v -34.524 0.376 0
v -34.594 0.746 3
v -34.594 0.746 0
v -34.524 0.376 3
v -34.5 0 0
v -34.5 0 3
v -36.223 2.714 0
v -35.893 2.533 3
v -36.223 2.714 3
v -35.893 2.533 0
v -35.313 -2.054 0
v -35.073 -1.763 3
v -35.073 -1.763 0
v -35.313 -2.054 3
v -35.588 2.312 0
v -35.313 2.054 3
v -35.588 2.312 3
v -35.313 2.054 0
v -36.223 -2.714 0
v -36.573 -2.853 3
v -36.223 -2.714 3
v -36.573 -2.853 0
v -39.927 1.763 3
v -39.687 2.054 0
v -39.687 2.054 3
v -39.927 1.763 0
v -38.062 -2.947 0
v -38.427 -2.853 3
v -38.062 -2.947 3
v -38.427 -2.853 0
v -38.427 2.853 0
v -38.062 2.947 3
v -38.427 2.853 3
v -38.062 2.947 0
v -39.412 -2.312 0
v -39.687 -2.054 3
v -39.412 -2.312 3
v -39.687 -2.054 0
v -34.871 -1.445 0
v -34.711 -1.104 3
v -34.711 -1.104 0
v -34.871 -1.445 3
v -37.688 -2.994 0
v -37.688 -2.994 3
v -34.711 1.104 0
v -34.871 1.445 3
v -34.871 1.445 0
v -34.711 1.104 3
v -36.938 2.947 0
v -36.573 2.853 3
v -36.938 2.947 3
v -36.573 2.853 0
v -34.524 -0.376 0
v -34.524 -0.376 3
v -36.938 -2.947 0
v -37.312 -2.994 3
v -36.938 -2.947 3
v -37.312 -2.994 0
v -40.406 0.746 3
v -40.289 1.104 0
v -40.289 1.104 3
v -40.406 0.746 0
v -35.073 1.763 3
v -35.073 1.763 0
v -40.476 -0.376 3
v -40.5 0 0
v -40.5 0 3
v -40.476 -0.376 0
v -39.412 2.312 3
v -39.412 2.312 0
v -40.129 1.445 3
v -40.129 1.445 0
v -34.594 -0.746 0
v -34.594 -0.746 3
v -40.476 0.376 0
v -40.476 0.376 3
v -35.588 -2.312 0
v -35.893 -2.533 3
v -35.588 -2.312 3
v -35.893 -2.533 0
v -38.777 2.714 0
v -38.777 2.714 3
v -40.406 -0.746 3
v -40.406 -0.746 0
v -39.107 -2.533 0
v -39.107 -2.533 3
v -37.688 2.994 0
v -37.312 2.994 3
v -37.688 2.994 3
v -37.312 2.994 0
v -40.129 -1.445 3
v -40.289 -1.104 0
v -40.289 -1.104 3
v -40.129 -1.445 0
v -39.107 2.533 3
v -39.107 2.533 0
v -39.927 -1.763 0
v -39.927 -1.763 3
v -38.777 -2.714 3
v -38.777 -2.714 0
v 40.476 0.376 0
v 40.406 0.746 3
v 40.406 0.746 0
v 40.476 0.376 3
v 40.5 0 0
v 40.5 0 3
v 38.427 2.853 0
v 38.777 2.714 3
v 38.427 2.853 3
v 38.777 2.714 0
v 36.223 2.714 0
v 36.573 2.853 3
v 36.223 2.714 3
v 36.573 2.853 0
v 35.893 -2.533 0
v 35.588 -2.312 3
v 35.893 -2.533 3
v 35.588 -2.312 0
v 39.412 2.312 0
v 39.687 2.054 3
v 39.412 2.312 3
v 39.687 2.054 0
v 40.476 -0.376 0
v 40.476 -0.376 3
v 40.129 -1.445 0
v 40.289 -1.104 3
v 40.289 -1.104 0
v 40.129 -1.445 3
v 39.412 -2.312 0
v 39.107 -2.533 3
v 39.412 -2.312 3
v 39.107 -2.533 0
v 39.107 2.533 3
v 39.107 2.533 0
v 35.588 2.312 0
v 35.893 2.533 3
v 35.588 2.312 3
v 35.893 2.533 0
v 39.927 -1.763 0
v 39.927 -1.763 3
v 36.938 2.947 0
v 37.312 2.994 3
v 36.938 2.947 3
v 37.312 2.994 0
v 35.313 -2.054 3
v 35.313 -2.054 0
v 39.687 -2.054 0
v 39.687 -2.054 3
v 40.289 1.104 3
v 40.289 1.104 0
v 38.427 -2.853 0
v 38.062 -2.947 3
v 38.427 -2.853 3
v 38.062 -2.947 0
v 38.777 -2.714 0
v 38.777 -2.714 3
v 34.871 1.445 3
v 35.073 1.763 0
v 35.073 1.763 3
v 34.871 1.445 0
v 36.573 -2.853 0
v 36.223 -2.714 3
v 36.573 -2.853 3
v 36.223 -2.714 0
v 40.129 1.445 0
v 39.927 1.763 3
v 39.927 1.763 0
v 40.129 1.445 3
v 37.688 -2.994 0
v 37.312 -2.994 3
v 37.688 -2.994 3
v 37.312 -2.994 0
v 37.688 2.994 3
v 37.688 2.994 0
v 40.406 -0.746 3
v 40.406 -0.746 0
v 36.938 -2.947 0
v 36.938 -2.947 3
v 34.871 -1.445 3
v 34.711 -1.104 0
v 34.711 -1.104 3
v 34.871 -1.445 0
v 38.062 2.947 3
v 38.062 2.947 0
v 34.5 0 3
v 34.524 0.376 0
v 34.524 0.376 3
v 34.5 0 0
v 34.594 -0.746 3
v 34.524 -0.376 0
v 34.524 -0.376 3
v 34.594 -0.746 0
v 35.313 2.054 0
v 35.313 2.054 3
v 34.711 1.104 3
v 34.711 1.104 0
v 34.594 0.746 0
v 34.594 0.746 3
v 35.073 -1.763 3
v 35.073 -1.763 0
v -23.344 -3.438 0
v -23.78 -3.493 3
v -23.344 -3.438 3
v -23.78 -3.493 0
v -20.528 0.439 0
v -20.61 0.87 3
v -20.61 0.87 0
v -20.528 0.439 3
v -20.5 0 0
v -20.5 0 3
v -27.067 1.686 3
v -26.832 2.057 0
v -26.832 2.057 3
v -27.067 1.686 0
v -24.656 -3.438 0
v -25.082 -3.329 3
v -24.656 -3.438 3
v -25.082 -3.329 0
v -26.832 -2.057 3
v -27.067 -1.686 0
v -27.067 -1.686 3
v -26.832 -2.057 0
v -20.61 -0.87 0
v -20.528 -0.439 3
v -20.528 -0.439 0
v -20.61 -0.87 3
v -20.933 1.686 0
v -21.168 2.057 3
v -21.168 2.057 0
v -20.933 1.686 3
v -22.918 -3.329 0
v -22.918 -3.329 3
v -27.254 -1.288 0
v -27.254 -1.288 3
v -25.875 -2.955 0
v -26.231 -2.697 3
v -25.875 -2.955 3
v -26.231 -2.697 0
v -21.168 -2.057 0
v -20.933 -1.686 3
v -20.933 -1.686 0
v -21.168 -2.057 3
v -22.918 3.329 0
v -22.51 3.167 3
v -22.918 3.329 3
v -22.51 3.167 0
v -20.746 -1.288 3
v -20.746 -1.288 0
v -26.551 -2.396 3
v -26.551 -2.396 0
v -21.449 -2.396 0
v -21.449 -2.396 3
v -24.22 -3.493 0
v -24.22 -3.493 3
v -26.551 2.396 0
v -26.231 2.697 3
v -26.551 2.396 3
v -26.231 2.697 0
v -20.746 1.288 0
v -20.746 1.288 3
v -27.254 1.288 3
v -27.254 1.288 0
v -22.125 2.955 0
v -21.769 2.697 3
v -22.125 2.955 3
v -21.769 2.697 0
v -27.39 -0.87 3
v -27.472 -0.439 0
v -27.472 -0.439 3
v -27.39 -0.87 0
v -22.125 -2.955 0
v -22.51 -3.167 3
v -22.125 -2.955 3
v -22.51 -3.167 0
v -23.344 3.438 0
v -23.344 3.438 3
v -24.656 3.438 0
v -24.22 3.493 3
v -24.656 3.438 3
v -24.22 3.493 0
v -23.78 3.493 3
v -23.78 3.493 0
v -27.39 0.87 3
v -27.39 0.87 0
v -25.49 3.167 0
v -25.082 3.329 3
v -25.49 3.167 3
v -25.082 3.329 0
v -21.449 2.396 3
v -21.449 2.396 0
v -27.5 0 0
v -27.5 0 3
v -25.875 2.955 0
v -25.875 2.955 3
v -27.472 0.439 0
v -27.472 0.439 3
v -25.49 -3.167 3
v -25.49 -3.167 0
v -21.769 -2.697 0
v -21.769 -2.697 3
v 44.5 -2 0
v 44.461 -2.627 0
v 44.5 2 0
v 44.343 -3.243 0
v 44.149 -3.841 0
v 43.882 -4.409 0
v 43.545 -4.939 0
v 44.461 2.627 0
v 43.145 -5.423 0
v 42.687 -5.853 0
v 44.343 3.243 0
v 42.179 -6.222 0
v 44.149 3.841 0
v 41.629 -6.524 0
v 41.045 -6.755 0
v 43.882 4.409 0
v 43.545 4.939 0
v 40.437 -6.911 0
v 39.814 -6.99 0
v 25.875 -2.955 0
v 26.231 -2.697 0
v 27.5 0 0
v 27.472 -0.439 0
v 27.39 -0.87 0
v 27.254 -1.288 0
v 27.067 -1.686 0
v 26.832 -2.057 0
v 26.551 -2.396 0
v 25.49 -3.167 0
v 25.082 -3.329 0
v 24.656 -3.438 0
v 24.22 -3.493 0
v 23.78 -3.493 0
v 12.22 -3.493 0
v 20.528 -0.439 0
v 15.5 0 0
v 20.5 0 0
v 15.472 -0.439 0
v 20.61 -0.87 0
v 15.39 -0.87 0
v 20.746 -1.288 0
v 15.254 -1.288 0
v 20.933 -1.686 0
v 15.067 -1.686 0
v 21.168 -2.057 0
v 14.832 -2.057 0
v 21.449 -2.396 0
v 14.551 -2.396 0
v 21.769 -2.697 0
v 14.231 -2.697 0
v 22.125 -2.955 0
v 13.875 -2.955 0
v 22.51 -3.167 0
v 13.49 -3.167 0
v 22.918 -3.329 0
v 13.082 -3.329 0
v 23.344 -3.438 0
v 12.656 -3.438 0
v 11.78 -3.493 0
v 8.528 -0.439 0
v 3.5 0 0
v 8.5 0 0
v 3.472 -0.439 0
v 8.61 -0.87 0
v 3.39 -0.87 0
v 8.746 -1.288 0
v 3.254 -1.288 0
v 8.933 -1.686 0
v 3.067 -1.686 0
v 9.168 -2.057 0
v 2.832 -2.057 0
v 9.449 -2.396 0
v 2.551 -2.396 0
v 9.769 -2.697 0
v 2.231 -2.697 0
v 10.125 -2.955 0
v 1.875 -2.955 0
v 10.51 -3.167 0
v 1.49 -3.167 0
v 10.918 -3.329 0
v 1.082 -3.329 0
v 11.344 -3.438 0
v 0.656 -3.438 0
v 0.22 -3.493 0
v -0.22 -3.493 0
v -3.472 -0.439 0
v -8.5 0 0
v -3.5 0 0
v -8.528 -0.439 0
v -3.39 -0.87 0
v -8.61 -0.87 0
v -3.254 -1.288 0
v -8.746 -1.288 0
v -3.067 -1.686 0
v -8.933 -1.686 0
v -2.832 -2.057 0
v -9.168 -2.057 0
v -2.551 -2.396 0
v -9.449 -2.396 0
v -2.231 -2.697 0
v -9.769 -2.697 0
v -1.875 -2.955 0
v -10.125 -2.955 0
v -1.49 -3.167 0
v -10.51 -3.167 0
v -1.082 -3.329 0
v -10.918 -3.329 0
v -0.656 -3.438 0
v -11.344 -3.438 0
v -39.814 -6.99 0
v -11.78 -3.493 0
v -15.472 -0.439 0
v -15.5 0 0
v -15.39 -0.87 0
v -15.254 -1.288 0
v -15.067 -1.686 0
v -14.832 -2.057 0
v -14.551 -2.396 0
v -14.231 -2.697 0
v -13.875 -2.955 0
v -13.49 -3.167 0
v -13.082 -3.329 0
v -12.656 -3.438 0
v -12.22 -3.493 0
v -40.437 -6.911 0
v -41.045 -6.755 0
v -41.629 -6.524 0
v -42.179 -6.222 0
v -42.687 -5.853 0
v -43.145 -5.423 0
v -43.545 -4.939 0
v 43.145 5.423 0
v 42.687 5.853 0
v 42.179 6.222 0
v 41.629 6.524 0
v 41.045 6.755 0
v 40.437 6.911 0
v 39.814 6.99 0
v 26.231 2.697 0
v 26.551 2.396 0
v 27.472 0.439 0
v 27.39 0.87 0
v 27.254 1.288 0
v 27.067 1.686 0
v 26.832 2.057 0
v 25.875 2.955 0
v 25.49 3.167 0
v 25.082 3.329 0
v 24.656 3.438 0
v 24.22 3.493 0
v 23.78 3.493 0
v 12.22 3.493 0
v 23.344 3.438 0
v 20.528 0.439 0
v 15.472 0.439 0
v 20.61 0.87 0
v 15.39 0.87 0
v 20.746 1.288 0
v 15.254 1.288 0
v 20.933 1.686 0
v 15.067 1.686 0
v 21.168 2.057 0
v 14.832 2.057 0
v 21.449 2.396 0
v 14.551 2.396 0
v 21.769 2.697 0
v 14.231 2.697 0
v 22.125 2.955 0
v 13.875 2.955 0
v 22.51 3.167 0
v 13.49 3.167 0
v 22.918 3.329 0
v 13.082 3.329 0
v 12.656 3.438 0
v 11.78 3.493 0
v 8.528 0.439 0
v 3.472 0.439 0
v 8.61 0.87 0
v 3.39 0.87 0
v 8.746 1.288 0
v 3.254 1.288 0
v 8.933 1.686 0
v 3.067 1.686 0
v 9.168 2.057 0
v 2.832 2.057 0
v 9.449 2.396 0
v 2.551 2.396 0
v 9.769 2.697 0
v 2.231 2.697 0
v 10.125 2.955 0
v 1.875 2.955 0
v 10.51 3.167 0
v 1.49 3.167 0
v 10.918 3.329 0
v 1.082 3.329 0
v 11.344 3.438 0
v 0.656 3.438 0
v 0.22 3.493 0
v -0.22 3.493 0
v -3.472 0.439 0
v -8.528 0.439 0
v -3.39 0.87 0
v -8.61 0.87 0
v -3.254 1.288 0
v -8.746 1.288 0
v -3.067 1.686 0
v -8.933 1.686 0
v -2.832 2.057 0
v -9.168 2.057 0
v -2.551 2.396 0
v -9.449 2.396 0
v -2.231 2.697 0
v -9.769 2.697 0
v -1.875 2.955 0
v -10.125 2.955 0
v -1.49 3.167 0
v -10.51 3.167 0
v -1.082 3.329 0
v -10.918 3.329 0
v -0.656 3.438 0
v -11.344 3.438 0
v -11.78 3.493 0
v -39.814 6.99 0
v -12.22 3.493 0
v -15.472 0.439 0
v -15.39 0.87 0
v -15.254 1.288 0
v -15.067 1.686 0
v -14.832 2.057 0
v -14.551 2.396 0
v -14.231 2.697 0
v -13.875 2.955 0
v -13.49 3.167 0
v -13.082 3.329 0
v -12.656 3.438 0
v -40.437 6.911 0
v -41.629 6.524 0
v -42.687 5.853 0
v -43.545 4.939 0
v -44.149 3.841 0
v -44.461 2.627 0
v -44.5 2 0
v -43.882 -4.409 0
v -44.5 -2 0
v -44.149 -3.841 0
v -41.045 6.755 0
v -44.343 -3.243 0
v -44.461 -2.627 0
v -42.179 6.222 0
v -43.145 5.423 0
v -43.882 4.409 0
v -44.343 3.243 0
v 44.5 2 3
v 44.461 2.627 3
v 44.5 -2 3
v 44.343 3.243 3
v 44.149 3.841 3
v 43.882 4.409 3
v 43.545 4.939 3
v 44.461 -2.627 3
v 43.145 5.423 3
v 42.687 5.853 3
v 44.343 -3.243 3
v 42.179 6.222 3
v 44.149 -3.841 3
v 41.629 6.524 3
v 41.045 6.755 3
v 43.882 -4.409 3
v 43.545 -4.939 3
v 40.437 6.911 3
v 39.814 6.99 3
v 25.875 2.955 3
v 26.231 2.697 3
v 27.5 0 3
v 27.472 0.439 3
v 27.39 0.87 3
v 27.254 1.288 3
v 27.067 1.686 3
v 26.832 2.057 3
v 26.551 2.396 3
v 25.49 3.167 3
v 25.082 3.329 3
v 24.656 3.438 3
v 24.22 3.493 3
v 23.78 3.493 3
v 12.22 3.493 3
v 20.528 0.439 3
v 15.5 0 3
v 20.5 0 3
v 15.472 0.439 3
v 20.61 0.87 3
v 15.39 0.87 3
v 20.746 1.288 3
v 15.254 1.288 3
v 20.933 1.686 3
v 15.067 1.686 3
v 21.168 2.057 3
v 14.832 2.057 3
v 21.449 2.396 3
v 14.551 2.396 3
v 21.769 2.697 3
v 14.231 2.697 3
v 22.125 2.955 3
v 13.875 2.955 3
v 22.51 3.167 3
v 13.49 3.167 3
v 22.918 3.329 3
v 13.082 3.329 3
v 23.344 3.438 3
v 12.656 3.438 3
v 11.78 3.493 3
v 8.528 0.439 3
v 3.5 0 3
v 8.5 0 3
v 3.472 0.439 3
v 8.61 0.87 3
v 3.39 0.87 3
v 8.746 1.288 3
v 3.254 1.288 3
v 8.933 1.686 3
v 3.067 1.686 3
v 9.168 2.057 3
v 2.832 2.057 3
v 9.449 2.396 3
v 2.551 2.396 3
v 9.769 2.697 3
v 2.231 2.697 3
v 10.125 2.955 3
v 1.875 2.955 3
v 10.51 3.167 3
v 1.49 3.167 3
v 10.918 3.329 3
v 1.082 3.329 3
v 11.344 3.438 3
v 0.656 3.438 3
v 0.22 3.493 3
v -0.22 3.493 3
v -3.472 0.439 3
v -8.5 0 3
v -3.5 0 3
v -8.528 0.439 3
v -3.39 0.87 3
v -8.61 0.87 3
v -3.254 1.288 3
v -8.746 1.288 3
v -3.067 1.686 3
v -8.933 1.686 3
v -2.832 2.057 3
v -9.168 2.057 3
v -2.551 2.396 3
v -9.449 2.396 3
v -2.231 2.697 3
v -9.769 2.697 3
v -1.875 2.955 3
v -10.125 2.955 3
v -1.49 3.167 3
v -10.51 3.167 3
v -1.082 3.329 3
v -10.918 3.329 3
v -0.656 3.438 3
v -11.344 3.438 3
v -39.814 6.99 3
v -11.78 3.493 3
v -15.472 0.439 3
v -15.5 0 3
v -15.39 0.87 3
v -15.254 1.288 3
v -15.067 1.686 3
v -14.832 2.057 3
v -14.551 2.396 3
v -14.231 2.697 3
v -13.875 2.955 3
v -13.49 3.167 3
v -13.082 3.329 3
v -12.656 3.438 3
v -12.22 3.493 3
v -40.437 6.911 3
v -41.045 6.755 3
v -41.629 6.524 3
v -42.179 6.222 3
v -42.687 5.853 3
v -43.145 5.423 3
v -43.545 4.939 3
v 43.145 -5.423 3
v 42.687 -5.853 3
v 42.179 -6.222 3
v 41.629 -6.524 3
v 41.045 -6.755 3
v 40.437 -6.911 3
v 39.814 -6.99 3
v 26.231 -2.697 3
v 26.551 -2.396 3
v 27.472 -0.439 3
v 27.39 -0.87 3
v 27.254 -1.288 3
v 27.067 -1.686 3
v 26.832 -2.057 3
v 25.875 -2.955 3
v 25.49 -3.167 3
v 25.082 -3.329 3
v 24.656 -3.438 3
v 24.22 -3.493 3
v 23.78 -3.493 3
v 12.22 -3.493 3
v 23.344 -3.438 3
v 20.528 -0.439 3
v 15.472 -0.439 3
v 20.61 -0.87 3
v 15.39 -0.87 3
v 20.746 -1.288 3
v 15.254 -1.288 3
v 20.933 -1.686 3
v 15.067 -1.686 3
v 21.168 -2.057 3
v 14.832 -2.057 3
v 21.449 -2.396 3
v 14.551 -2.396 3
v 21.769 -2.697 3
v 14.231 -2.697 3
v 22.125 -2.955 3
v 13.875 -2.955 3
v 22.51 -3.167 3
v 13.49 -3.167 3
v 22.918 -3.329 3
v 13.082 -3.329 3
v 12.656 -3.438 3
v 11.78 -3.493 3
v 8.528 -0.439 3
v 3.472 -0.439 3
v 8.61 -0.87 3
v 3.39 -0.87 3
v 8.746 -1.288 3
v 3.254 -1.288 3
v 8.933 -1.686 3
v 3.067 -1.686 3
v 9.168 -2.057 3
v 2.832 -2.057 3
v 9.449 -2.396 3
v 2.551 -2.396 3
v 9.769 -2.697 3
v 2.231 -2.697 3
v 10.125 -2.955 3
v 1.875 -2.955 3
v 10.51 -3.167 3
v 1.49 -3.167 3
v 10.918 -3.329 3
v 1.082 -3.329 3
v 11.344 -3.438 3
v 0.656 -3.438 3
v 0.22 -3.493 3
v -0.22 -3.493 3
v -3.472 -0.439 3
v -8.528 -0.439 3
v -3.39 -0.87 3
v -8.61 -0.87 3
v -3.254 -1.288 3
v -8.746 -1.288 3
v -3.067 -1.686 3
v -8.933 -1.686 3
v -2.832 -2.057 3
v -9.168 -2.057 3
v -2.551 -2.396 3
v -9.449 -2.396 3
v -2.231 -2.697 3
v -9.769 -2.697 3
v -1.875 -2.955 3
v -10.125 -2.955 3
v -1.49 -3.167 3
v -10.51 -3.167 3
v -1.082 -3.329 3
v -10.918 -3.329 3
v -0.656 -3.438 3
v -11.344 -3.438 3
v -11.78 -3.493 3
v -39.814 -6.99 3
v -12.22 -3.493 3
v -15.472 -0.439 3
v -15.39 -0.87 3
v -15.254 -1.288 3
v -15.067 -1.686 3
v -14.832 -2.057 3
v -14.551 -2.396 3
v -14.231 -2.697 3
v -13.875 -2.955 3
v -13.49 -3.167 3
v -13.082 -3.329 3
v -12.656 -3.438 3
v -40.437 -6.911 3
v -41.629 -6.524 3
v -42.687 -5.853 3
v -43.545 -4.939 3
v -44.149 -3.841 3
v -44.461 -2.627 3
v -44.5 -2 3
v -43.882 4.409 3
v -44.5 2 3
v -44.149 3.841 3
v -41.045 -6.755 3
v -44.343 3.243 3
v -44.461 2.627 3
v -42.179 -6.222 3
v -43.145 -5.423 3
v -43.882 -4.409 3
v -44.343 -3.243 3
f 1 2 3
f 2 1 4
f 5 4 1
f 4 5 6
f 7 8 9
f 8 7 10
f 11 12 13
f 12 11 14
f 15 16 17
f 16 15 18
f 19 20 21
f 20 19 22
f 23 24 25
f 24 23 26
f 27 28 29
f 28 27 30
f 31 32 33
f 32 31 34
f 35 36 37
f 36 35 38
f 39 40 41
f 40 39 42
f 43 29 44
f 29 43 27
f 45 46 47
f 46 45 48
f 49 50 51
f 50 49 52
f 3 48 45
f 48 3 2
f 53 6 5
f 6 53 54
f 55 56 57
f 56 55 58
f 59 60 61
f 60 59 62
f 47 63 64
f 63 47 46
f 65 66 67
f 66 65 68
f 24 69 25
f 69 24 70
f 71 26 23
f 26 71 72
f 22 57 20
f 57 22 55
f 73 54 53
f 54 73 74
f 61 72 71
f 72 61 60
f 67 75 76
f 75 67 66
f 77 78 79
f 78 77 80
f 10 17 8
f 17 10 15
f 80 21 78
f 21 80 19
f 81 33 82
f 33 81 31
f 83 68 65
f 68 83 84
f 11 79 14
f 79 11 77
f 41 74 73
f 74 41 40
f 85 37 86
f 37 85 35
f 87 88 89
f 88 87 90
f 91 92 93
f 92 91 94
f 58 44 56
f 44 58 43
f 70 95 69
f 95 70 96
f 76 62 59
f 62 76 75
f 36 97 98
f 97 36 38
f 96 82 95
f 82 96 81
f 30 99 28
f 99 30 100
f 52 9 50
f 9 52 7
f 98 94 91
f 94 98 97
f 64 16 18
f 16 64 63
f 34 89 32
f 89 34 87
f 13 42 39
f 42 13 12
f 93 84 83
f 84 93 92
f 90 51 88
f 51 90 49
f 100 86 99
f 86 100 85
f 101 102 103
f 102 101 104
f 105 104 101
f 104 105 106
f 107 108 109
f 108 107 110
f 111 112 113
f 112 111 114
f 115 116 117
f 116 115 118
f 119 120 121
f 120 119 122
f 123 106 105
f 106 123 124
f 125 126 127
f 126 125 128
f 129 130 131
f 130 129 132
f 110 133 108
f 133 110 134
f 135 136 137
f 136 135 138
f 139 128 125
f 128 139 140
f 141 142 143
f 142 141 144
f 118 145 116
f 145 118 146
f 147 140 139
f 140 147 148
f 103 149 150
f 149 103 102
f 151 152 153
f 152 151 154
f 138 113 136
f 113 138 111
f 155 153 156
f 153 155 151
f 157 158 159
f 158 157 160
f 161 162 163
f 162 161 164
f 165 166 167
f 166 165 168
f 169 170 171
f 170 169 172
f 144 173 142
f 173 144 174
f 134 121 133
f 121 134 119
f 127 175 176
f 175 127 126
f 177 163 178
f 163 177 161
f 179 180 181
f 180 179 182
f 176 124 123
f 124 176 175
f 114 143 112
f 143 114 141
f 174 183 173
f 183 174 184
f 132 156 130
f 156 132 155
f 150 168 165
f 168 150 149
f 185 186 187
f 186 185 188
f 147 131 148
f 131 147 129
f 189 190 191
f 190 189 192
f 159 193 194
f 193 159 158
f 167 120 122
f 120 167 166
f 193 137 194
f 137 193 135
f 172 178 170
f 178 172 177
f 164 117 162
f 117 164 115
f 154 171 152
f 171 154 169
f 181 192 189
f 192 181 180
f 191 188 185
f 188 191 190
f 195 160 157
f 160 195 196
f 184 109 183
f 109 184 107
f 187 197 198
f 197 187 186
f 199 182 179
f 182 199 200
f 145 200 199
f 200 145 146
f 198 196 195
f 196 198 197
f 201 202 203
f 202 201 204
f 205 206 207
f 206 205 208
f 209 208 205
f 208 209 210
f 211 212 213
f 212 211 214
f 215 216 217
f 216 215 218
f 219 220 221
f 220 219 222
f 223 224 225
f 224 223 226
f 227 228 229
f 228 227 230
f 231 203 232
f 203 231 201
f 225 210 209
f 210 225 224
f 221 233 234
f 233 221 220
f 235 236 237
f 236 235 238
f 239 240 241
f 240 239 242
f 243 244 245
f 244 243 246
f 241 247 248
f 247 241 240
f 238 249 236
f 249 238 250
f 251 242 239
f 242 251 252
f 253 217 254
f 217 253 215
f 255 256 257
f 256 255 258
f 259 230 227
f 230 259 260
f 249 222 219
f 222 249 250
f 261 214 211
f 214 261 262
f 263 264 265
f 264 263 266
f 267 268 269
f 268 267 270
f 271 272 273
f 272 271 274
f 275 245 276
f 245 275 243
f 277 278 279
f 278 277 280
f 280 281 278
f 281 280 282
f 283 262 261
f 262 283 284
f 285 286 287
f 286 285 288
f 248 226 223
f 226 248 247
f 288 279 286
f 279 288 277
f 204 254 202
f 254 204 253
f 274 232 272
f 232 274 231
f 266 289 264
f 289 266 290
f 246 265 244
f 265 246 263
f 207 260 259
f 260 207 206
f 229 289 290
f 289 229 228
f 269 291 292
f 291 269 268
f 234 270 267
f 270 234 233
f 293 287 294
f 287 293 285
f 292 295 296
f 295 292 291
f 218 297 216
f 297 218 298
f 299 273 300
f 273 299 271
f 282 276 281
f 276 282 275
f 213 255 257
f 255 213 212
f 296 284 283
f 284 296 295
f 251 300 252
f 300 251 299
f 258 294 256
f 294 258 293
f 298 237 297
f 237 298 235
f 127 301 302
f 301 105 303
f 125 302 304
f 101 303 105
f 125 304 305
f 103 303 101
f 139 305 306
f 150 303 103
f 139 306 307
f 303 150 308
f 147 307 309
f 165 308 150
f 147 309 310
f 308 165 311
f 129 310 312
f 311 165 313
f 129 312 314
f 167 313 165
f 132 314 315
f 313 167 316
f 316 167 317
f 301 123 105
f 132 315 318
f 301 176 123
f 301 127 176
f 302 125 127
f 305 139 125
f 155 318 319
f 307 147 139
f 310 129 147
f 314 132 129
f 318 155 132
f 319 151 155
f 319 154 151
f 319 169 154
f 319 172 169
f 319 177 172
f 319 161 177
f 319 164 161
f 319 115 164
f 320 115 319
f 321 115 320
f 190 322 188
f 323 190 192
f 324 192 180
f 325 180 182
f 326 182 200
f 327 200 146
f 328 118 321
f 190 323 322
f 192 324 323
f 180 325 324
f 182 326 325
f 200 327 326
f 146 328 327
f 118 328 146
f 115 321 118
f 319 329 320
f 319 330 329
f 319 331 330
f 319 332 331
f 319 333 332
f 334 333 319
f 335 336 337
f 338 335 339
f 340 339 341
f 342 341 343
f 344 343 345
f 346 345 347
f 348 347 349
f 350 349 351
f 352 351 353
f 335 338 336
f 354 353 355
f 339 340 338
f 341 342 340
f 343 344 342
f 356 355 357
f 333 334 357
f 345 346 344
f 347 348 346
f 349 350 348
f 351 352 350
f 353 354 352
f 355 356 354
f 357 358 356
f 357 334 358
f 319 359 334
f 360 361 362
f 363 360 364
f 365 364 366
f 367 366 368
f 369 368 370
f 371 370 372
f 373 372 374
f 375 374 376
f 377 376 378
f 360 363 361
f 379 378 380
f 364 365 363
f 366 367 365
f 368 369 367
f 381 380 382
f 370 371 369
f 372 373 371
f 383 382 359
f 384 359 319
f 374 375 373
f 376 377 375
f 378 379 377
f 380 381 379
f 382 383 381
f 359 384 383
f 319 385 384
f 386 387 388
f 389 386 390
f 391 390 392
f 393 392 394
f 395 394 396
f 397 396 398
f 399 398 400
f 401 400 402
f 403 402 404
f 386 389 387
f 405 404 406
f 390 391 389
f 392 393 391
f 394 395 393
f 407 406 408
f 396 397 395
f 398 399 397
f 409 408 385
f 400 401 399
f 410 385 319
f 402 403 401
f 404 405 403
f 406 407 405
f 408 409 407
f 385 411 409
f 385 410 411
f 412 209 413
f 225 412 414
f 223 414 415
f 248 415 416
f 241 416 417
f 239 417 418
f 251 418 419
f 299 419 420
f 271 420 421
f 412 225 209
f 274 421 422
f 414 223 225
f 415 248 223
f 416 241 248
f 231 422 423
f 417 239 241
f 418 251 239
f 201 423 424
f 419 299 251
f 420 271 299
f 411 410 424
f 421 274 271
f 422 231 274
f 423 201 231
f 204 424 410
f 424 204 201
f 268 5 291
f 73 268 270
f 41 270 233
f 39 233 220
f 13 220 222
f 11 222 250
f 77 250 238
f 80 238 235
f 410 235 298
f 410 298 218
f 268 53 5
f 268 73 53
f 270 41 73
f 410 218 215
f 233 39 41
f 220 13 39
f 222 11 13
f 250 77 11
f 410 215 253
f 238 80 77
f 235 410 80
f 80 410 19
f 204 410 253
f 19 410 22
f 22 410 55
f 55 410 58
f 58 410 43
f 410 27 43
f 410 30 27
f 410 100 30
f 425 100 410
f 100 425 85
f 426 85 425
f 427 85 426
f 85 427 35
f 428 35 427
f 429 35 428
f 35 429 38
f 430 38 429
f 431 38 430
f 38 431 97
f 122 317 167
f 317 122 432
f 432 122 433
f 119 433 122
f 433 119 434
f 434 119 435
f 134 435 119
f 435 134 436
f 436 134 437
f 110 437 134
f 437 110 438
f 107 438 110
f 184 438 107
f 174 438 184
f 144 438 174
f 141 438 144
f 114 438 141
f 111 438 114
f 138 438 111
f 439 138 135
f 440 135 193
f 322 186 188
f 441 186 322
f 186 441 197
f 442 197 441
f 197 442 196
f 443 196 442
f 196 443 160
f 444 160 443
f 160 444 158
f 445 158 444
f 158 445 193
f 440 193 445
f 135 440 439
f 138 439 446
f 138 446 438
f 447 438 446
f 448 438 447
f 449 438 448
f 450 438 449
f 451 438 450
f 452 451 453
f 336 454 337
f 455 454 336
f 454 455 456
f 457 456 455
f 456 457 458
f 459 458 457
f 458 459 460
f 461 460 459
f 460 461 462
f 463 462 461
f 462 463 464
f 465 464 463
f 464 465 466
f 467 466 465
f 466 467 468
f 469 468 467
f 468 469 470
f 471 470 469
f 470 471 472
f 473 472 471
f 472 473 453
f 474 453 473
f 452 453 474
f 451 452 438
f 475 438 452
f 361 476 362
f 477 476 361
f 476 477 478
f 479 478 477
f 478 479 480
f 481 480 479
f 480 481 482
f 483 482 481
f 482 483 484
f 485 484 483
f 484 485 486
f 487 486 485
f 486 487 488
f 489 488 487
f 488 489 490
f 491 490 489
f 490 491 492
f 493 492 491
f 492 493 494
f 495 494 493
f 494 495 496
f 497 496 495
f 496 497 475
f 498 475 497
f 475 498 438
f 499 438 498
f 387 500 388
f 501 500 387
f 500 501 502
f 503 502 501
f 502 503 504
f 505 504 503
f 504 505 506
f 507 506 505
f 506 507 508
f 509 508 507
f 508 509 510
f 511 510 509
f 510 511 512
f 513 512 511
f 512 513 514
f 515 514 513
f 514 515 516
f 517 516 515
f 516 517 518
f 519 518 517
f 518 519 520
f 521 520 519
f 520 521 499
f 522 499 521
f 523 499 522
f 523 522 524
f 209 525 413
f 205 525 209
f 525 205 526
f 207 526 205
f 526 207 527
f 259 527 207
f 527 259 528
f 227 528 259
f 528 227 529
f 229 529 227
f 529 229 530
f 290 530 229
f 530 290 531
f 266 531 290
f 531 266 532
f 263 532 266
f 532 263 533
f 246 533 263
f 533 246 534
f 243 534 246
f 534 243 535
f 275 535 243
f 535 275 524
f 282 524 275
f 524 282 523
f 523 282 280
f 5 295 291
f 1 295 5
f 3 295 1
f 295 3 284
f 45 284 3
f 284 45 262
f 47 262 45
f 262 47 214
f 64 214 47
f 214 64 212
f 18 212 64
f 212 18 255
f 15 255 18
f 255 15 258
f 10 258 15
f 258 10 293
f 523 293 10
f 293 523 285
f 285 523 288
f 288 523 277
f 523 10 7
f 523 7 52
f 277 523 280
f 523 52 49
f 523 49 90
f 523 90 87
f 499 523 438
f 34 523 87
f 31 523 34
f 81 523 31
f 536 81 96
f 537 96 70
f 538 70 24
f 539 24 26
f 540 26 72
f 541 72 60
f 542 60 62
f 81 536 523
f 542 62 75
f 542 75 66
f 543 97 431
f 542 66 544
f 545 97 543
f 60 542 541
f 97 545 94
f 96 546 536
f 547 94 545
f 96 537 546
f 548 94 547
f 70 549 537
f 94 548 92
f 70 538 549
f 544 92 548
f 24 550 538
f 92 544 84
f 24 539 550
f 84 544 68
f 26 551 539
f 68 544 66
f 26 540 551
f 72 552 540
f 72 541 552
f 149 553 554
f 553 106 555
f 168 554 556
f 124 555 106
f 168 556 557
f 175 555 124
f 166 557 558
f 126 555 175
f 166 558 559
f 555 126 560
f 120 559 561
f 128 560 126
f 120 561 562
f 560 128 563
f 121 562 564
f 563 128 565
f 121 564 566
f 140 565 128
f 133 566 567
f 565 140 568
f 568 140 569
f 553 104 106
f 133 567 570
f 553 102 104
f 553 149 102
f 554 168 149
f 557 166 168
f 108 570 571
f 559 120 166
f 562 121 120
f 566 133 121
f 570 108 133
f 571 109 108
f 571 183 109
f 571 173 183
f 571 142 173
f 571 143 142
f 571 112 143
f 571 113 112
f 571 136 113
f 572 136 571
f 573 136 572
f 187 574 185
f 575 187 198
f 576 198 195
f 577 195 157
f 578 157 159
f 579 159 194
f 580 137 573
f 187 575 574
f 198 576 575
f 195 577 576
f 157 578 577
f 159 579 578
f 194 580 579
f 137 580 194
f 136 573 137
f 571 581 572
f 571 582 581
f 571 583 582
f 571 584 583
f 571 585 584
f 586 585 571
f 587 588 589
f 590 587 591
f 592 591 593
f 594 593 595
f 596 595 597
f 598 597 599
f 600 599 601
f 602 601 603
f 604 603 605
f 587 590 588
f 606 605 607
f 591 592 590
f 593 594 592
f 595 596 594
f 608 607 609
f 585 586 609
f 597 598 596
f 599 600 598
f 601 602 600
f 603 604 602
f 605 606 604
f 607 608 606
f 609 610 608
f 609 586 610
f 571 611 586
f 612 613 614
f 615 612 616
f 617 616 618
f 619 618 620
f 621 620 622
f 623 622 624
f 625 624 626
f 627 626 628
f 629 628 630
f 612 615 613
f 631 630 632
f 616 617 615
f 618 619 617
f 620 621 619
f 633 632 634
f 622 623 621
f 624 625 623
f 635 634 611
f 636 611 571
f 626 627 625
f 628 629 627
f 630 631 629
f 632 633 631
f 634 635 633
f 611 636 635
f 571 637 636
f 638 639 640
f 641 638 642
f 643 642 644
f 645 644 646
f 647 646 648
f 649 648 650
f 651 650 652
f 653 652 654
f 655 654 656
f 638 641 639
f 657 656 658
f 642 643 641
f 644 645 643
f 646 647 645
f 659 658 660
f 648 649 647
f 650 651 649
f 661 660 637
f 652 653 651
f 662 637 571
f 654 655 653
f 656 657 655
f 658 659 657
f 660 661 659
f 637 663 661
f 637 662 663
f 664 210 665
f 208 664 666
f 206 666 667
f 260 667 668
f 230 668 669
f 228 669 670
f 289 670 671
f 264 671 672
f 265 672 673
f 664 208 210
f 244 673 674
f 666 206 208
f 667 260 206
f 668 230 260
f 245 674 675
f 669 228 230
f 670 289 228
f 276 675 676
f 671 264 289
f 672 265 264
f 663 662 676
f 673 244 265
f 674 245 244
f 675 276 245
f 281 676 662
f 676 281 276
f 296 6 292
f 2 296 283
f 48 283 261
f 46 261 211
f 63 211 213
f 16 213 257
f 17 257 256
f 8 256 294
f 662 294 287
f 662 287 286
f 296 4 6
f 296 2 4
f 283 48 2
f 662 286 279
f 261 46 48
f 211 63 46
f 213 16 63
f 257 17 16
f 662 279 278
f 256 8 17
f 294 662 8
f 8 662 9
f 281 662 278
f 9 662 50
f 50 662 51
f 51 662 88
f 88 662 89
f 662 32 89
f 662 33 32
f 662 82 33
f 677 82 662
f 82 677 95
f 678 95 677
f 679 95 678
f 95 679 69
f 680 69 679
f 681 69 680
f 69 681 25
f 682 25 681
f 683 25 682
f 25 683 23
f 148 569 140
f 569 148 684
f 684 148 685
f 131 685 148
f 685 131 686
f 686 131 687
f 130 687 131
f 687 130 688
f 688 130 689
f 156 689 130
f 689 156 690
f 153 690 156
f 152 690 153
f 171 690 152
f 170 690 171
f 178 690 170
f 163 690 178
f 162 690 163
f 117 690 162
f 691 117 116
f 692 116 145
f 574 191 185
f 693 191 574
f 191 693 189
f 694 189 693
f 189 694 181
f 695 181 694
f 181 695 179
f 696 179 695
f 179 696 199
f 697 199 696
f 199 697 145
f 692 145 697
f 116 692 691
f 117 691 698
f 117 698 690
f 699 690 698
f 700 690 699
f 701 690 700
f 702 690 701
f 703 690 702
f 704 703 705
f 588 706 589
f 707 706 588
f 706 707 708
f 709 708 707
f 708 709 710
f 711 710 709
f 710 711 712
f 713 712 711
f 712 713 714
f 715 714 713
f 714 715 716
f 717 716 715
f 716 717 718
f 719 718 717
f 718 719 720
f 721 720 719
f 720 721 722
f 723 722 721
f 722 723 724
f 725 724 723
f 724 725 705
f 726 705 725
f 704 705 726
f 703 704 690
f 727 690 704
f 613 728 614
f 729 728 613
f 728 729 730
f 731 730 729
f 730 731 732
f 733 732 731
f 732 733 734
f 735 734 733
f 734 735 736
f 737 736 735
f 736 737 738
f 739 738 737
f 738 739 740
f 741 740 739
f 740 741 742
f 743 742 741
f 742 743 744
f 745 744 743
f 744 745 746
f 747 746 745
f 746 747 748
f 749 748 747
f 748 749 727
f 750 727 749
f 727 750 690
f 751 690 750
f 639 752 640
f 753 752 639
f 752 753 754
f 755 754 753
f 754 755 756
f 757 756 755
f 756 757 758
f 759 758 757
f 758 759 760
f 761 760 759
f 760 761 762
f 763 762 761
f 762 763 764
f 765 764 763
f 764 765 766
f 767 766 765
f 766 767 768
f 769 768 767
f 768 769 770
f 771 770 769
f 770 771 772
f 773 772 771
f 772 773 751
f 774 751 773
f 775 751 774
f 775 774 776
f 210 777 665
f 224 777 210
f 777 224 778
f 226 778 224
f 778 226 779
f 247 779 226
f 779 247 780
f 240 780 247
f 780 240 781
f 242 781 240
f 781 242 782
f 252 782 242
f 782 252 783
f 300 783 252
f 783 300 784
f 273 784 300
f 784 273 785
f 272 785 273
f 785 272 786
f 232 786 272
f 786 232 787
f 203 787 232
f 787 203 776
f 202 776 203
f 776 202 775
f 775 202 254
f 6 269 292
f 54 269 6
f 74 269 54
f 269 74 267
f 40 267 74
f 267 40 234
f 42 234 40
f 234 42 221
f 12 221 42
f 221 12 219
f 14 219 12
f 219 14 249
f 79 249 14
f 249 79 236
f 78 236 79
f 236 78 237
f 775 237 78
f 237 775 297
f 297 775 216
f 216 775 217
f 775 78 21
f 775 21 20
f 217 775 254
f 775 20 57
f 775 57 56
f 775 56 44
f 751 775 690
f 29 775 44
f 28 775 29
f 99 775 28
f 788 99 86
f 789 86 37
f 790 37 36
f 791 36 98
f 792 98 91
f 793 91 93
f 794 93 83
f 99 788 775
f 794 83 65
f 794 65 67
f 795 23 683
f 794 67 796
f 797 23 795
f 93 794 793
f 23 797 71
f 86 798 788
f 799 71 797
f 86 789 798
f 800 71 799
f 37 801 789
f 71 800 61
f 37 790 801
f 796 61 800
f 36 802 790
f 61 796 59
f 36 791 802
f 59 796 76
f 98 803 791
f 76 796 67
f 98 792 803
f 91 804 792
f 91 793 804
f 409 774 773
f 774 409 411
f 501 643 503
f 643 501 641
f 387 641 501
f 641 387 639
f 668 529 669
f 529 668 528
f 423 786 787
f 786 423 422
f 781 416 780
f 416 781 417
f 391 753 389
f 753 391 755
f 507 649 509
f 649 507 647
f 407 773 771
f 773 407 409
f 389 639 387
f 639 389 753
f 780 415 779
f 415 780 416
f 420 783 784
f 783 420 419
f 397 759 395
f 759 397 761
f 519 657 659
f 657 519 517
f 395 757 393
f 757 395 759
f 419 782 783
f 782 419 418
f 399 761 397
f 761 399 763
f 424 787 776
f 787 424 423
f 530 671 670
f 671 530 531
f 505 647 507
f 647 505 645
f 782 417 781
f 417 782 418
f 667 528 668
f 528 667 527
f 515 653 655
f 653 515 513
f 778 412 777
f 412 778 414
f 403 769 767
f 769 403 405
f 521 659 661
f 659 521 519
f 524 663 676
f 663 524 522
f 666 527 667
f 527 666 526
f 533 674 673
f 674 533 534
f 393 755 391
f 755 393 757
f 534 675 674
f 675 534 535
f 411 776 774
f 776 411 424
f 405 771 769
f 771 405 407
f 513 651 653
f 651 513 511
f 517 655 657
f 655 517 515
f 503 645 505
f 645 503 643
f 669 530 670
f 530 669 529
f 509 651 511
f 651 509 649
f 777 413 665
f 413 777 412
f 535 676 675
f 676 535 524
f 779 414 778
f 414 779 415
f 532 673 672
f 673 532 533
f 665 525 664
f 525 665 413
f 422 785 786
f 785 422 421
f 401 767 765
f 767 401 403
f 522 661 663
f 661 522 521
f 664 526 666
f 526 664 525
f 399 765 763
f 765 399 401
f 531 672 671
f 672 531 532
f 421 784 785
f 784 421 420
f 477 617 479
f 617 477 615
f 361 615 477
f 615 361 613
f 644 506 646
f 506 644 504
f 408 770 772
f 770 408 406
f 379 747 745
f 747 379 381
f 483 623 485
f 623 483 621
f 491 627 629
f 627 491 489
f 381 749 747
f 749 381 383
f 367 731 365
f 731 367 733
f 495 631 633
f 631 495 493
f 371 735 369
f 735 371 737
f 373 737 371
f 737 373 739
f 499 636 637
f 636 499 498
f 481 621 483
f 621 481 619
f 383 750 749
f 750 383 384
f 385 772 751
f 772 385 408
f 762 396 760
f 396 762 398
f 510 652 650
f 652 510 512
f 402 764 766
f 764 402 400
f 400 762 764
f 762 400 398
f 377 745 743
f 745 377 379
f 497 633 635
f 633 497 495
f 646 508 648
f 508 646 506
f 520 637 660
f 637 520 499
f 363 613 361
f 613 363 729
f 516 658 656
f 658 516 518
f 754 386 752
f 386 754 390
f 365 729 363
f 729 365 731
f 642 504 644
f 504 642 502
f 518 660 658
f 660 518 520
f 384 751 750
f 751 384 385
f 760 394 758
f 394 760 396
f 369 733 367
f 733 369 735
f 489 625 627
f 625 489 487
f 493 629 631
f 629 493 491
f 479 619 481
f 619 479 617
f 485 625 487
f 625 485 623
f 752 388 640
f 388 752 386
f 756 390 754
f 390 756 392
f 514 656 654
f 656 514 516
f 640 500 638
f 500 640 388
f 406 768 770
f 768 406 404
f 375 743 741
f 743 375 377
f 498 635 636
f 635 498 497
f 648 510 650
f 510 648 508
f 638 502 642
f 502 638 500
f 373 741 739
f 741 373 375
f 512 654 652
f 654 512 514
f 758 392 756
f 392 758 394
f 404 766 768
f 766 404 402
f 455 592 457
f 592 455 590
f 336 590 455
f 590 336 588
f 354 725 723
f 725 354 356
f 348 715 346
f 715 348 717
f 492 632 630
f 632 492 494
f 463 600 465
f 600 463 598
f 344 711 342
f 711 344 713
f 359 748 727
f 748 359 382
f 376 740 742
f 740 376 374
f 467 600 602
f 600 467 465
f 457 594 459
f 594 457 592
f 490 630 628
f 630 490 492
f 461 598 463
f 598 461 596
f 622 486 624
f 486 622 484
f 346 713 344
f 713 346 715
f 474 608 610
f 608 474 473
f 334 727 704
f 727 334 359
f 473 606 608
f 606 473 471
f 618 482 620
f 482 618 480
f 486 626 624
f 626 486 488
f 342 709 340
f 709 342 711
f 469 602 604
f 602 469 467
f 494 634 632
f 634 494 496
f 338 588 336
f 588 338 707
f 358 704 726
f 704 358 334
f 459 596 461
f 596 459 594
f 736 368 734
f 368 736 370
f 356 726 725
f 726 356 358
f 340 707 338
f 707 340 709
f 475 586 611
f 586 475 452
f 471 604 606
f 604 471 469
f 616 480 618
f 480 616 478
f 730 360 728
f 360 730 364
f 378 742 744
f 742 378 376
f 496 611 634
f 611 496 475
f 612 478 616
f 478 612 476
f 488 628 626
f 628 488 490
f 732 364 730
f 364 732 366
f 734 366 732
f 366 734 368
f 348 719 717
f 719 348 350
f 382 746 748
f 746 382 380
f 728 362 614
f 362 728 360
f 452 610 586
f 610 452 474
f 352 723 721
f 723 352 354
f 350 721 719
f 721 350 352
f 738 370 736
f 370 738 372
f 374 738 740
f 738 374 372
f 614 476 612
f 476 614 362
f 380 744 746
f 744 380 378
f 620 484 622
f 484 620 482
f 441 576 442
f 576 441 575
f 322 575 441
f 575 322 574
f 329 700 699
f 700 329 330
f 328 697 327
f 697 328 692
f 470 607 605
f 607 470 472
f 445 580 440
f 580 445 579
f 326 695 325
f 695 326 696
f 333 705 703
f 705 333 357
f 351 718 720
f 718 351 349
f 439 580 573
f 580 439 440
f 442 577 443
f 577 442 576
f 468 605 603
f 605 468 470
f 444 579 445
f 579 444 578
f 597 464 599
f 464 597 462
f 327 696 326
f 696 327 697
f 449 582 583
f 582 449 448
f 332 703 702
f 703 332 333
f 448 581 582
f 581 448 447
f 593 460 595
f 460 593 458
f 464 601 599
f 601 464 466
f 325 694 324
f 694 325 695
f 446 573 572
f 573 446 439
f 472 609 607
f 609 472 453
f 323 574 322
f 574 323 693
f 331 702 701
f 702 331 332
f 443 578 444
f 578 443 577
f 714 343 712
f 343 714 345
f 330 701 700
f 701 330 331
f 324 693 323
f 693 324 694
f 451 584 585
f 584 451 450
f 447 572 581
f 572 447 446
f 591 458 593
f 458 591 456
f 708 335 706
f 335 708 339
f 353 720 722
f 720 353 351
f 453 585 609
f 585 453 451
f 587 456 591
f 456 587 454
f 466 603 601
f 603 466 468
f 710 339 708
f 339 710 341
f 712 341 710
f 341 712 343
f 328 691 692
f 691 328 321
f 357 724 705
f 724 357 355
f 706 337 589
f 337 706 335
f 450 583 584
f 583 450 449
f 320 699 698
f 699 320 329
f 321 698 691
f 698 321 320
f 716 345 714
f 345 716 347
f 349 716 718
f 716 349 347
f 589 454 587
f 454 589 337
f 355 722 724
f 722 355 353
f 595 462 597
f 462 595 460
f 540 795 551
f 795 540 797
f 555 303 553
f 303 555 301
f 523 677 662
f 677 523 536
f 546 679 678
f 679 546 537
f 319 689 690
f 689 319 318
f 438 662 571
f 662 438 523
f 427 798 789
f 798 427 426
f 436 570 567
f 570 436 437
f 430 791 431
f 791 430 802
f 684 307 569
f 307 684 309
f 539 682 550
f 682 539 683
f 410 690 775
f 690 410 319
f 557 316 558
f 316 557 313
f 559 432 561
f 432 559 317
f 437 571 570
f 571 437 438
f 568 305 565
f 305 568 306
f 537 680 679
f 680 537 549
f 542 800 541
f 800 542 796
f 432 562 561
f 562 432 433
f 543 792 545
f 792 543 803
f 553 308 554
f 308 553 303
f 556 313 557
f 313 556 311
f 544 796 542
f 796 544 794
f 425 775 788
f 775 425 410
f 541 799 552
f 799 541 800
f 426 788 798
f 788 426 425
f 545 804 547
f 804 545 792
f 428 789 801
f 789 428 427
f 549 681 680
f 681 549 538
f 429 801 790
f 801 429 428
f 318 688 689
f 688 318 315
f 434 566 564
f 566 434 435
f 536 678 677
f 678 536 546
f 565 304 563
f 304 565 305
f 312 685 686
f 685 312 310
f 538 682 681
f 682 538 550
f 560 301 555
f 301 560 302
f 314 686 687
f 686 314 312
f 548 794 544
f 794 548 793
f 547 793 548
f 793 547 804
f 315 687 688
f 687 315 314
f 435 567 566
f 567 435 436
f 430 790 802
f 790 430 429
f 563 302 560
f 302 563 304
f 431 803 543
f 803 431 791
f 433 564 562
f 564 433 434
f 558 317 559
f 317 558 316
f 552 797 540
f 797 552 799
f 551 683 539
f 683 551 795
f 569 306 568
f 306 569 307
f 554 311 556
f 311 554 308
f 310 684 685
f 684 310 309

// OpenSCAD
$fn = 50;


difference() {
	union() {
		hull() {
			translate(v = [-39.5000000000, 2.0000000000, 0]) {
				cylinder(h = 3, r = 5);
			}
			translate(v = [39.5000000000, 2.0000000000, 0]) {
				cylinder(h = 3, r = 5);
			}
			translate(v = [-39.5000000000, -2.0000000000, 0]) {
				cylinder(h = 3, r = 5);
			}
			translate(v = [39.5000000000, -2.0000000000, 0]) {
				cylinder(h = 3, r = 5);
			}
		}
	}
	union() {
		#translate(v = [-37.5000000000, 0.0000000000, 0]) {
			cylinder(h = 3, r = 3.0000000000);
		}
		#translate(v = [37.5000000000, 0.0000000000, 0]) {
			cylinder(h = 3, r = 3.0000000000);
		}
		#translate(v = [-37.5000000000, 0.0000000000, -100.0000000000]) {
			cylinder(h = 200, r = 3.0000000000);
		}
		#translate(v = [-37.5000000000, 0.0000000000, -100.0000000000]) {
			cylinder(h = 200, r = 3.0000000000);
		}
		#translate(v = [37.5000000000, 0.0000000000, -100.0000000000]) {
			cylinder(h = 200, r = 3.0000000000);
		}
		#translate(v = [37.5000000000, 0.0000000000, -100.0000000000]) {
			cylinder(h = 200, r = 3.0000000000);
		}
		#translate(v = [-37.5000000000, 0.0000000000, 0]) {
			cylinder(h = 3, r = 1.5000000000);
		}
		#translate(v = [37.5000000000, 0.0000000000, 0]) {
			cylinder(h = 3, r = 1.5000000000);
		}
		#translate(v = [-37.5000000000, 0.0000000000, 0]) {
			cylinder(h = 3, r = 1.5000000000);
		}
		#translate(v = [37.5000000000, 0.0000000000, 0]) {
			cylinder(h = 3, r = 1.5000000000);
		}
		#translate(v = [-37.5000000000, 0.0000000000, 0]) {
			cylinder(h = 3, r = 1.5000000000);
		}
		#translate(v = [37.5000000000, 0.0000000000, 0]) {
			cylinder(h = 3, r = 1.5000000000);
		}
		#translate(v = [-24.0000000000, 0, 0]) {
			cylinder(h = 3, r = 3.5000000000);
		}
		#translate(v = [-12.0000000000, 0, 0]) {
			cylinder(h = 3, r = 3.5000000000);
		}
		#cylinder(h = 3, r = 3.5000000000);
		#translate(v = [12.0000000000, 0, 0]) {
			cylinder(h = 3, r = 3.5000000000);
		}
		#translate(v = [24.0000000000, 0, 0]) {
			cylinder(h = 3, r = 3.5000000000);
		}
	}
}
